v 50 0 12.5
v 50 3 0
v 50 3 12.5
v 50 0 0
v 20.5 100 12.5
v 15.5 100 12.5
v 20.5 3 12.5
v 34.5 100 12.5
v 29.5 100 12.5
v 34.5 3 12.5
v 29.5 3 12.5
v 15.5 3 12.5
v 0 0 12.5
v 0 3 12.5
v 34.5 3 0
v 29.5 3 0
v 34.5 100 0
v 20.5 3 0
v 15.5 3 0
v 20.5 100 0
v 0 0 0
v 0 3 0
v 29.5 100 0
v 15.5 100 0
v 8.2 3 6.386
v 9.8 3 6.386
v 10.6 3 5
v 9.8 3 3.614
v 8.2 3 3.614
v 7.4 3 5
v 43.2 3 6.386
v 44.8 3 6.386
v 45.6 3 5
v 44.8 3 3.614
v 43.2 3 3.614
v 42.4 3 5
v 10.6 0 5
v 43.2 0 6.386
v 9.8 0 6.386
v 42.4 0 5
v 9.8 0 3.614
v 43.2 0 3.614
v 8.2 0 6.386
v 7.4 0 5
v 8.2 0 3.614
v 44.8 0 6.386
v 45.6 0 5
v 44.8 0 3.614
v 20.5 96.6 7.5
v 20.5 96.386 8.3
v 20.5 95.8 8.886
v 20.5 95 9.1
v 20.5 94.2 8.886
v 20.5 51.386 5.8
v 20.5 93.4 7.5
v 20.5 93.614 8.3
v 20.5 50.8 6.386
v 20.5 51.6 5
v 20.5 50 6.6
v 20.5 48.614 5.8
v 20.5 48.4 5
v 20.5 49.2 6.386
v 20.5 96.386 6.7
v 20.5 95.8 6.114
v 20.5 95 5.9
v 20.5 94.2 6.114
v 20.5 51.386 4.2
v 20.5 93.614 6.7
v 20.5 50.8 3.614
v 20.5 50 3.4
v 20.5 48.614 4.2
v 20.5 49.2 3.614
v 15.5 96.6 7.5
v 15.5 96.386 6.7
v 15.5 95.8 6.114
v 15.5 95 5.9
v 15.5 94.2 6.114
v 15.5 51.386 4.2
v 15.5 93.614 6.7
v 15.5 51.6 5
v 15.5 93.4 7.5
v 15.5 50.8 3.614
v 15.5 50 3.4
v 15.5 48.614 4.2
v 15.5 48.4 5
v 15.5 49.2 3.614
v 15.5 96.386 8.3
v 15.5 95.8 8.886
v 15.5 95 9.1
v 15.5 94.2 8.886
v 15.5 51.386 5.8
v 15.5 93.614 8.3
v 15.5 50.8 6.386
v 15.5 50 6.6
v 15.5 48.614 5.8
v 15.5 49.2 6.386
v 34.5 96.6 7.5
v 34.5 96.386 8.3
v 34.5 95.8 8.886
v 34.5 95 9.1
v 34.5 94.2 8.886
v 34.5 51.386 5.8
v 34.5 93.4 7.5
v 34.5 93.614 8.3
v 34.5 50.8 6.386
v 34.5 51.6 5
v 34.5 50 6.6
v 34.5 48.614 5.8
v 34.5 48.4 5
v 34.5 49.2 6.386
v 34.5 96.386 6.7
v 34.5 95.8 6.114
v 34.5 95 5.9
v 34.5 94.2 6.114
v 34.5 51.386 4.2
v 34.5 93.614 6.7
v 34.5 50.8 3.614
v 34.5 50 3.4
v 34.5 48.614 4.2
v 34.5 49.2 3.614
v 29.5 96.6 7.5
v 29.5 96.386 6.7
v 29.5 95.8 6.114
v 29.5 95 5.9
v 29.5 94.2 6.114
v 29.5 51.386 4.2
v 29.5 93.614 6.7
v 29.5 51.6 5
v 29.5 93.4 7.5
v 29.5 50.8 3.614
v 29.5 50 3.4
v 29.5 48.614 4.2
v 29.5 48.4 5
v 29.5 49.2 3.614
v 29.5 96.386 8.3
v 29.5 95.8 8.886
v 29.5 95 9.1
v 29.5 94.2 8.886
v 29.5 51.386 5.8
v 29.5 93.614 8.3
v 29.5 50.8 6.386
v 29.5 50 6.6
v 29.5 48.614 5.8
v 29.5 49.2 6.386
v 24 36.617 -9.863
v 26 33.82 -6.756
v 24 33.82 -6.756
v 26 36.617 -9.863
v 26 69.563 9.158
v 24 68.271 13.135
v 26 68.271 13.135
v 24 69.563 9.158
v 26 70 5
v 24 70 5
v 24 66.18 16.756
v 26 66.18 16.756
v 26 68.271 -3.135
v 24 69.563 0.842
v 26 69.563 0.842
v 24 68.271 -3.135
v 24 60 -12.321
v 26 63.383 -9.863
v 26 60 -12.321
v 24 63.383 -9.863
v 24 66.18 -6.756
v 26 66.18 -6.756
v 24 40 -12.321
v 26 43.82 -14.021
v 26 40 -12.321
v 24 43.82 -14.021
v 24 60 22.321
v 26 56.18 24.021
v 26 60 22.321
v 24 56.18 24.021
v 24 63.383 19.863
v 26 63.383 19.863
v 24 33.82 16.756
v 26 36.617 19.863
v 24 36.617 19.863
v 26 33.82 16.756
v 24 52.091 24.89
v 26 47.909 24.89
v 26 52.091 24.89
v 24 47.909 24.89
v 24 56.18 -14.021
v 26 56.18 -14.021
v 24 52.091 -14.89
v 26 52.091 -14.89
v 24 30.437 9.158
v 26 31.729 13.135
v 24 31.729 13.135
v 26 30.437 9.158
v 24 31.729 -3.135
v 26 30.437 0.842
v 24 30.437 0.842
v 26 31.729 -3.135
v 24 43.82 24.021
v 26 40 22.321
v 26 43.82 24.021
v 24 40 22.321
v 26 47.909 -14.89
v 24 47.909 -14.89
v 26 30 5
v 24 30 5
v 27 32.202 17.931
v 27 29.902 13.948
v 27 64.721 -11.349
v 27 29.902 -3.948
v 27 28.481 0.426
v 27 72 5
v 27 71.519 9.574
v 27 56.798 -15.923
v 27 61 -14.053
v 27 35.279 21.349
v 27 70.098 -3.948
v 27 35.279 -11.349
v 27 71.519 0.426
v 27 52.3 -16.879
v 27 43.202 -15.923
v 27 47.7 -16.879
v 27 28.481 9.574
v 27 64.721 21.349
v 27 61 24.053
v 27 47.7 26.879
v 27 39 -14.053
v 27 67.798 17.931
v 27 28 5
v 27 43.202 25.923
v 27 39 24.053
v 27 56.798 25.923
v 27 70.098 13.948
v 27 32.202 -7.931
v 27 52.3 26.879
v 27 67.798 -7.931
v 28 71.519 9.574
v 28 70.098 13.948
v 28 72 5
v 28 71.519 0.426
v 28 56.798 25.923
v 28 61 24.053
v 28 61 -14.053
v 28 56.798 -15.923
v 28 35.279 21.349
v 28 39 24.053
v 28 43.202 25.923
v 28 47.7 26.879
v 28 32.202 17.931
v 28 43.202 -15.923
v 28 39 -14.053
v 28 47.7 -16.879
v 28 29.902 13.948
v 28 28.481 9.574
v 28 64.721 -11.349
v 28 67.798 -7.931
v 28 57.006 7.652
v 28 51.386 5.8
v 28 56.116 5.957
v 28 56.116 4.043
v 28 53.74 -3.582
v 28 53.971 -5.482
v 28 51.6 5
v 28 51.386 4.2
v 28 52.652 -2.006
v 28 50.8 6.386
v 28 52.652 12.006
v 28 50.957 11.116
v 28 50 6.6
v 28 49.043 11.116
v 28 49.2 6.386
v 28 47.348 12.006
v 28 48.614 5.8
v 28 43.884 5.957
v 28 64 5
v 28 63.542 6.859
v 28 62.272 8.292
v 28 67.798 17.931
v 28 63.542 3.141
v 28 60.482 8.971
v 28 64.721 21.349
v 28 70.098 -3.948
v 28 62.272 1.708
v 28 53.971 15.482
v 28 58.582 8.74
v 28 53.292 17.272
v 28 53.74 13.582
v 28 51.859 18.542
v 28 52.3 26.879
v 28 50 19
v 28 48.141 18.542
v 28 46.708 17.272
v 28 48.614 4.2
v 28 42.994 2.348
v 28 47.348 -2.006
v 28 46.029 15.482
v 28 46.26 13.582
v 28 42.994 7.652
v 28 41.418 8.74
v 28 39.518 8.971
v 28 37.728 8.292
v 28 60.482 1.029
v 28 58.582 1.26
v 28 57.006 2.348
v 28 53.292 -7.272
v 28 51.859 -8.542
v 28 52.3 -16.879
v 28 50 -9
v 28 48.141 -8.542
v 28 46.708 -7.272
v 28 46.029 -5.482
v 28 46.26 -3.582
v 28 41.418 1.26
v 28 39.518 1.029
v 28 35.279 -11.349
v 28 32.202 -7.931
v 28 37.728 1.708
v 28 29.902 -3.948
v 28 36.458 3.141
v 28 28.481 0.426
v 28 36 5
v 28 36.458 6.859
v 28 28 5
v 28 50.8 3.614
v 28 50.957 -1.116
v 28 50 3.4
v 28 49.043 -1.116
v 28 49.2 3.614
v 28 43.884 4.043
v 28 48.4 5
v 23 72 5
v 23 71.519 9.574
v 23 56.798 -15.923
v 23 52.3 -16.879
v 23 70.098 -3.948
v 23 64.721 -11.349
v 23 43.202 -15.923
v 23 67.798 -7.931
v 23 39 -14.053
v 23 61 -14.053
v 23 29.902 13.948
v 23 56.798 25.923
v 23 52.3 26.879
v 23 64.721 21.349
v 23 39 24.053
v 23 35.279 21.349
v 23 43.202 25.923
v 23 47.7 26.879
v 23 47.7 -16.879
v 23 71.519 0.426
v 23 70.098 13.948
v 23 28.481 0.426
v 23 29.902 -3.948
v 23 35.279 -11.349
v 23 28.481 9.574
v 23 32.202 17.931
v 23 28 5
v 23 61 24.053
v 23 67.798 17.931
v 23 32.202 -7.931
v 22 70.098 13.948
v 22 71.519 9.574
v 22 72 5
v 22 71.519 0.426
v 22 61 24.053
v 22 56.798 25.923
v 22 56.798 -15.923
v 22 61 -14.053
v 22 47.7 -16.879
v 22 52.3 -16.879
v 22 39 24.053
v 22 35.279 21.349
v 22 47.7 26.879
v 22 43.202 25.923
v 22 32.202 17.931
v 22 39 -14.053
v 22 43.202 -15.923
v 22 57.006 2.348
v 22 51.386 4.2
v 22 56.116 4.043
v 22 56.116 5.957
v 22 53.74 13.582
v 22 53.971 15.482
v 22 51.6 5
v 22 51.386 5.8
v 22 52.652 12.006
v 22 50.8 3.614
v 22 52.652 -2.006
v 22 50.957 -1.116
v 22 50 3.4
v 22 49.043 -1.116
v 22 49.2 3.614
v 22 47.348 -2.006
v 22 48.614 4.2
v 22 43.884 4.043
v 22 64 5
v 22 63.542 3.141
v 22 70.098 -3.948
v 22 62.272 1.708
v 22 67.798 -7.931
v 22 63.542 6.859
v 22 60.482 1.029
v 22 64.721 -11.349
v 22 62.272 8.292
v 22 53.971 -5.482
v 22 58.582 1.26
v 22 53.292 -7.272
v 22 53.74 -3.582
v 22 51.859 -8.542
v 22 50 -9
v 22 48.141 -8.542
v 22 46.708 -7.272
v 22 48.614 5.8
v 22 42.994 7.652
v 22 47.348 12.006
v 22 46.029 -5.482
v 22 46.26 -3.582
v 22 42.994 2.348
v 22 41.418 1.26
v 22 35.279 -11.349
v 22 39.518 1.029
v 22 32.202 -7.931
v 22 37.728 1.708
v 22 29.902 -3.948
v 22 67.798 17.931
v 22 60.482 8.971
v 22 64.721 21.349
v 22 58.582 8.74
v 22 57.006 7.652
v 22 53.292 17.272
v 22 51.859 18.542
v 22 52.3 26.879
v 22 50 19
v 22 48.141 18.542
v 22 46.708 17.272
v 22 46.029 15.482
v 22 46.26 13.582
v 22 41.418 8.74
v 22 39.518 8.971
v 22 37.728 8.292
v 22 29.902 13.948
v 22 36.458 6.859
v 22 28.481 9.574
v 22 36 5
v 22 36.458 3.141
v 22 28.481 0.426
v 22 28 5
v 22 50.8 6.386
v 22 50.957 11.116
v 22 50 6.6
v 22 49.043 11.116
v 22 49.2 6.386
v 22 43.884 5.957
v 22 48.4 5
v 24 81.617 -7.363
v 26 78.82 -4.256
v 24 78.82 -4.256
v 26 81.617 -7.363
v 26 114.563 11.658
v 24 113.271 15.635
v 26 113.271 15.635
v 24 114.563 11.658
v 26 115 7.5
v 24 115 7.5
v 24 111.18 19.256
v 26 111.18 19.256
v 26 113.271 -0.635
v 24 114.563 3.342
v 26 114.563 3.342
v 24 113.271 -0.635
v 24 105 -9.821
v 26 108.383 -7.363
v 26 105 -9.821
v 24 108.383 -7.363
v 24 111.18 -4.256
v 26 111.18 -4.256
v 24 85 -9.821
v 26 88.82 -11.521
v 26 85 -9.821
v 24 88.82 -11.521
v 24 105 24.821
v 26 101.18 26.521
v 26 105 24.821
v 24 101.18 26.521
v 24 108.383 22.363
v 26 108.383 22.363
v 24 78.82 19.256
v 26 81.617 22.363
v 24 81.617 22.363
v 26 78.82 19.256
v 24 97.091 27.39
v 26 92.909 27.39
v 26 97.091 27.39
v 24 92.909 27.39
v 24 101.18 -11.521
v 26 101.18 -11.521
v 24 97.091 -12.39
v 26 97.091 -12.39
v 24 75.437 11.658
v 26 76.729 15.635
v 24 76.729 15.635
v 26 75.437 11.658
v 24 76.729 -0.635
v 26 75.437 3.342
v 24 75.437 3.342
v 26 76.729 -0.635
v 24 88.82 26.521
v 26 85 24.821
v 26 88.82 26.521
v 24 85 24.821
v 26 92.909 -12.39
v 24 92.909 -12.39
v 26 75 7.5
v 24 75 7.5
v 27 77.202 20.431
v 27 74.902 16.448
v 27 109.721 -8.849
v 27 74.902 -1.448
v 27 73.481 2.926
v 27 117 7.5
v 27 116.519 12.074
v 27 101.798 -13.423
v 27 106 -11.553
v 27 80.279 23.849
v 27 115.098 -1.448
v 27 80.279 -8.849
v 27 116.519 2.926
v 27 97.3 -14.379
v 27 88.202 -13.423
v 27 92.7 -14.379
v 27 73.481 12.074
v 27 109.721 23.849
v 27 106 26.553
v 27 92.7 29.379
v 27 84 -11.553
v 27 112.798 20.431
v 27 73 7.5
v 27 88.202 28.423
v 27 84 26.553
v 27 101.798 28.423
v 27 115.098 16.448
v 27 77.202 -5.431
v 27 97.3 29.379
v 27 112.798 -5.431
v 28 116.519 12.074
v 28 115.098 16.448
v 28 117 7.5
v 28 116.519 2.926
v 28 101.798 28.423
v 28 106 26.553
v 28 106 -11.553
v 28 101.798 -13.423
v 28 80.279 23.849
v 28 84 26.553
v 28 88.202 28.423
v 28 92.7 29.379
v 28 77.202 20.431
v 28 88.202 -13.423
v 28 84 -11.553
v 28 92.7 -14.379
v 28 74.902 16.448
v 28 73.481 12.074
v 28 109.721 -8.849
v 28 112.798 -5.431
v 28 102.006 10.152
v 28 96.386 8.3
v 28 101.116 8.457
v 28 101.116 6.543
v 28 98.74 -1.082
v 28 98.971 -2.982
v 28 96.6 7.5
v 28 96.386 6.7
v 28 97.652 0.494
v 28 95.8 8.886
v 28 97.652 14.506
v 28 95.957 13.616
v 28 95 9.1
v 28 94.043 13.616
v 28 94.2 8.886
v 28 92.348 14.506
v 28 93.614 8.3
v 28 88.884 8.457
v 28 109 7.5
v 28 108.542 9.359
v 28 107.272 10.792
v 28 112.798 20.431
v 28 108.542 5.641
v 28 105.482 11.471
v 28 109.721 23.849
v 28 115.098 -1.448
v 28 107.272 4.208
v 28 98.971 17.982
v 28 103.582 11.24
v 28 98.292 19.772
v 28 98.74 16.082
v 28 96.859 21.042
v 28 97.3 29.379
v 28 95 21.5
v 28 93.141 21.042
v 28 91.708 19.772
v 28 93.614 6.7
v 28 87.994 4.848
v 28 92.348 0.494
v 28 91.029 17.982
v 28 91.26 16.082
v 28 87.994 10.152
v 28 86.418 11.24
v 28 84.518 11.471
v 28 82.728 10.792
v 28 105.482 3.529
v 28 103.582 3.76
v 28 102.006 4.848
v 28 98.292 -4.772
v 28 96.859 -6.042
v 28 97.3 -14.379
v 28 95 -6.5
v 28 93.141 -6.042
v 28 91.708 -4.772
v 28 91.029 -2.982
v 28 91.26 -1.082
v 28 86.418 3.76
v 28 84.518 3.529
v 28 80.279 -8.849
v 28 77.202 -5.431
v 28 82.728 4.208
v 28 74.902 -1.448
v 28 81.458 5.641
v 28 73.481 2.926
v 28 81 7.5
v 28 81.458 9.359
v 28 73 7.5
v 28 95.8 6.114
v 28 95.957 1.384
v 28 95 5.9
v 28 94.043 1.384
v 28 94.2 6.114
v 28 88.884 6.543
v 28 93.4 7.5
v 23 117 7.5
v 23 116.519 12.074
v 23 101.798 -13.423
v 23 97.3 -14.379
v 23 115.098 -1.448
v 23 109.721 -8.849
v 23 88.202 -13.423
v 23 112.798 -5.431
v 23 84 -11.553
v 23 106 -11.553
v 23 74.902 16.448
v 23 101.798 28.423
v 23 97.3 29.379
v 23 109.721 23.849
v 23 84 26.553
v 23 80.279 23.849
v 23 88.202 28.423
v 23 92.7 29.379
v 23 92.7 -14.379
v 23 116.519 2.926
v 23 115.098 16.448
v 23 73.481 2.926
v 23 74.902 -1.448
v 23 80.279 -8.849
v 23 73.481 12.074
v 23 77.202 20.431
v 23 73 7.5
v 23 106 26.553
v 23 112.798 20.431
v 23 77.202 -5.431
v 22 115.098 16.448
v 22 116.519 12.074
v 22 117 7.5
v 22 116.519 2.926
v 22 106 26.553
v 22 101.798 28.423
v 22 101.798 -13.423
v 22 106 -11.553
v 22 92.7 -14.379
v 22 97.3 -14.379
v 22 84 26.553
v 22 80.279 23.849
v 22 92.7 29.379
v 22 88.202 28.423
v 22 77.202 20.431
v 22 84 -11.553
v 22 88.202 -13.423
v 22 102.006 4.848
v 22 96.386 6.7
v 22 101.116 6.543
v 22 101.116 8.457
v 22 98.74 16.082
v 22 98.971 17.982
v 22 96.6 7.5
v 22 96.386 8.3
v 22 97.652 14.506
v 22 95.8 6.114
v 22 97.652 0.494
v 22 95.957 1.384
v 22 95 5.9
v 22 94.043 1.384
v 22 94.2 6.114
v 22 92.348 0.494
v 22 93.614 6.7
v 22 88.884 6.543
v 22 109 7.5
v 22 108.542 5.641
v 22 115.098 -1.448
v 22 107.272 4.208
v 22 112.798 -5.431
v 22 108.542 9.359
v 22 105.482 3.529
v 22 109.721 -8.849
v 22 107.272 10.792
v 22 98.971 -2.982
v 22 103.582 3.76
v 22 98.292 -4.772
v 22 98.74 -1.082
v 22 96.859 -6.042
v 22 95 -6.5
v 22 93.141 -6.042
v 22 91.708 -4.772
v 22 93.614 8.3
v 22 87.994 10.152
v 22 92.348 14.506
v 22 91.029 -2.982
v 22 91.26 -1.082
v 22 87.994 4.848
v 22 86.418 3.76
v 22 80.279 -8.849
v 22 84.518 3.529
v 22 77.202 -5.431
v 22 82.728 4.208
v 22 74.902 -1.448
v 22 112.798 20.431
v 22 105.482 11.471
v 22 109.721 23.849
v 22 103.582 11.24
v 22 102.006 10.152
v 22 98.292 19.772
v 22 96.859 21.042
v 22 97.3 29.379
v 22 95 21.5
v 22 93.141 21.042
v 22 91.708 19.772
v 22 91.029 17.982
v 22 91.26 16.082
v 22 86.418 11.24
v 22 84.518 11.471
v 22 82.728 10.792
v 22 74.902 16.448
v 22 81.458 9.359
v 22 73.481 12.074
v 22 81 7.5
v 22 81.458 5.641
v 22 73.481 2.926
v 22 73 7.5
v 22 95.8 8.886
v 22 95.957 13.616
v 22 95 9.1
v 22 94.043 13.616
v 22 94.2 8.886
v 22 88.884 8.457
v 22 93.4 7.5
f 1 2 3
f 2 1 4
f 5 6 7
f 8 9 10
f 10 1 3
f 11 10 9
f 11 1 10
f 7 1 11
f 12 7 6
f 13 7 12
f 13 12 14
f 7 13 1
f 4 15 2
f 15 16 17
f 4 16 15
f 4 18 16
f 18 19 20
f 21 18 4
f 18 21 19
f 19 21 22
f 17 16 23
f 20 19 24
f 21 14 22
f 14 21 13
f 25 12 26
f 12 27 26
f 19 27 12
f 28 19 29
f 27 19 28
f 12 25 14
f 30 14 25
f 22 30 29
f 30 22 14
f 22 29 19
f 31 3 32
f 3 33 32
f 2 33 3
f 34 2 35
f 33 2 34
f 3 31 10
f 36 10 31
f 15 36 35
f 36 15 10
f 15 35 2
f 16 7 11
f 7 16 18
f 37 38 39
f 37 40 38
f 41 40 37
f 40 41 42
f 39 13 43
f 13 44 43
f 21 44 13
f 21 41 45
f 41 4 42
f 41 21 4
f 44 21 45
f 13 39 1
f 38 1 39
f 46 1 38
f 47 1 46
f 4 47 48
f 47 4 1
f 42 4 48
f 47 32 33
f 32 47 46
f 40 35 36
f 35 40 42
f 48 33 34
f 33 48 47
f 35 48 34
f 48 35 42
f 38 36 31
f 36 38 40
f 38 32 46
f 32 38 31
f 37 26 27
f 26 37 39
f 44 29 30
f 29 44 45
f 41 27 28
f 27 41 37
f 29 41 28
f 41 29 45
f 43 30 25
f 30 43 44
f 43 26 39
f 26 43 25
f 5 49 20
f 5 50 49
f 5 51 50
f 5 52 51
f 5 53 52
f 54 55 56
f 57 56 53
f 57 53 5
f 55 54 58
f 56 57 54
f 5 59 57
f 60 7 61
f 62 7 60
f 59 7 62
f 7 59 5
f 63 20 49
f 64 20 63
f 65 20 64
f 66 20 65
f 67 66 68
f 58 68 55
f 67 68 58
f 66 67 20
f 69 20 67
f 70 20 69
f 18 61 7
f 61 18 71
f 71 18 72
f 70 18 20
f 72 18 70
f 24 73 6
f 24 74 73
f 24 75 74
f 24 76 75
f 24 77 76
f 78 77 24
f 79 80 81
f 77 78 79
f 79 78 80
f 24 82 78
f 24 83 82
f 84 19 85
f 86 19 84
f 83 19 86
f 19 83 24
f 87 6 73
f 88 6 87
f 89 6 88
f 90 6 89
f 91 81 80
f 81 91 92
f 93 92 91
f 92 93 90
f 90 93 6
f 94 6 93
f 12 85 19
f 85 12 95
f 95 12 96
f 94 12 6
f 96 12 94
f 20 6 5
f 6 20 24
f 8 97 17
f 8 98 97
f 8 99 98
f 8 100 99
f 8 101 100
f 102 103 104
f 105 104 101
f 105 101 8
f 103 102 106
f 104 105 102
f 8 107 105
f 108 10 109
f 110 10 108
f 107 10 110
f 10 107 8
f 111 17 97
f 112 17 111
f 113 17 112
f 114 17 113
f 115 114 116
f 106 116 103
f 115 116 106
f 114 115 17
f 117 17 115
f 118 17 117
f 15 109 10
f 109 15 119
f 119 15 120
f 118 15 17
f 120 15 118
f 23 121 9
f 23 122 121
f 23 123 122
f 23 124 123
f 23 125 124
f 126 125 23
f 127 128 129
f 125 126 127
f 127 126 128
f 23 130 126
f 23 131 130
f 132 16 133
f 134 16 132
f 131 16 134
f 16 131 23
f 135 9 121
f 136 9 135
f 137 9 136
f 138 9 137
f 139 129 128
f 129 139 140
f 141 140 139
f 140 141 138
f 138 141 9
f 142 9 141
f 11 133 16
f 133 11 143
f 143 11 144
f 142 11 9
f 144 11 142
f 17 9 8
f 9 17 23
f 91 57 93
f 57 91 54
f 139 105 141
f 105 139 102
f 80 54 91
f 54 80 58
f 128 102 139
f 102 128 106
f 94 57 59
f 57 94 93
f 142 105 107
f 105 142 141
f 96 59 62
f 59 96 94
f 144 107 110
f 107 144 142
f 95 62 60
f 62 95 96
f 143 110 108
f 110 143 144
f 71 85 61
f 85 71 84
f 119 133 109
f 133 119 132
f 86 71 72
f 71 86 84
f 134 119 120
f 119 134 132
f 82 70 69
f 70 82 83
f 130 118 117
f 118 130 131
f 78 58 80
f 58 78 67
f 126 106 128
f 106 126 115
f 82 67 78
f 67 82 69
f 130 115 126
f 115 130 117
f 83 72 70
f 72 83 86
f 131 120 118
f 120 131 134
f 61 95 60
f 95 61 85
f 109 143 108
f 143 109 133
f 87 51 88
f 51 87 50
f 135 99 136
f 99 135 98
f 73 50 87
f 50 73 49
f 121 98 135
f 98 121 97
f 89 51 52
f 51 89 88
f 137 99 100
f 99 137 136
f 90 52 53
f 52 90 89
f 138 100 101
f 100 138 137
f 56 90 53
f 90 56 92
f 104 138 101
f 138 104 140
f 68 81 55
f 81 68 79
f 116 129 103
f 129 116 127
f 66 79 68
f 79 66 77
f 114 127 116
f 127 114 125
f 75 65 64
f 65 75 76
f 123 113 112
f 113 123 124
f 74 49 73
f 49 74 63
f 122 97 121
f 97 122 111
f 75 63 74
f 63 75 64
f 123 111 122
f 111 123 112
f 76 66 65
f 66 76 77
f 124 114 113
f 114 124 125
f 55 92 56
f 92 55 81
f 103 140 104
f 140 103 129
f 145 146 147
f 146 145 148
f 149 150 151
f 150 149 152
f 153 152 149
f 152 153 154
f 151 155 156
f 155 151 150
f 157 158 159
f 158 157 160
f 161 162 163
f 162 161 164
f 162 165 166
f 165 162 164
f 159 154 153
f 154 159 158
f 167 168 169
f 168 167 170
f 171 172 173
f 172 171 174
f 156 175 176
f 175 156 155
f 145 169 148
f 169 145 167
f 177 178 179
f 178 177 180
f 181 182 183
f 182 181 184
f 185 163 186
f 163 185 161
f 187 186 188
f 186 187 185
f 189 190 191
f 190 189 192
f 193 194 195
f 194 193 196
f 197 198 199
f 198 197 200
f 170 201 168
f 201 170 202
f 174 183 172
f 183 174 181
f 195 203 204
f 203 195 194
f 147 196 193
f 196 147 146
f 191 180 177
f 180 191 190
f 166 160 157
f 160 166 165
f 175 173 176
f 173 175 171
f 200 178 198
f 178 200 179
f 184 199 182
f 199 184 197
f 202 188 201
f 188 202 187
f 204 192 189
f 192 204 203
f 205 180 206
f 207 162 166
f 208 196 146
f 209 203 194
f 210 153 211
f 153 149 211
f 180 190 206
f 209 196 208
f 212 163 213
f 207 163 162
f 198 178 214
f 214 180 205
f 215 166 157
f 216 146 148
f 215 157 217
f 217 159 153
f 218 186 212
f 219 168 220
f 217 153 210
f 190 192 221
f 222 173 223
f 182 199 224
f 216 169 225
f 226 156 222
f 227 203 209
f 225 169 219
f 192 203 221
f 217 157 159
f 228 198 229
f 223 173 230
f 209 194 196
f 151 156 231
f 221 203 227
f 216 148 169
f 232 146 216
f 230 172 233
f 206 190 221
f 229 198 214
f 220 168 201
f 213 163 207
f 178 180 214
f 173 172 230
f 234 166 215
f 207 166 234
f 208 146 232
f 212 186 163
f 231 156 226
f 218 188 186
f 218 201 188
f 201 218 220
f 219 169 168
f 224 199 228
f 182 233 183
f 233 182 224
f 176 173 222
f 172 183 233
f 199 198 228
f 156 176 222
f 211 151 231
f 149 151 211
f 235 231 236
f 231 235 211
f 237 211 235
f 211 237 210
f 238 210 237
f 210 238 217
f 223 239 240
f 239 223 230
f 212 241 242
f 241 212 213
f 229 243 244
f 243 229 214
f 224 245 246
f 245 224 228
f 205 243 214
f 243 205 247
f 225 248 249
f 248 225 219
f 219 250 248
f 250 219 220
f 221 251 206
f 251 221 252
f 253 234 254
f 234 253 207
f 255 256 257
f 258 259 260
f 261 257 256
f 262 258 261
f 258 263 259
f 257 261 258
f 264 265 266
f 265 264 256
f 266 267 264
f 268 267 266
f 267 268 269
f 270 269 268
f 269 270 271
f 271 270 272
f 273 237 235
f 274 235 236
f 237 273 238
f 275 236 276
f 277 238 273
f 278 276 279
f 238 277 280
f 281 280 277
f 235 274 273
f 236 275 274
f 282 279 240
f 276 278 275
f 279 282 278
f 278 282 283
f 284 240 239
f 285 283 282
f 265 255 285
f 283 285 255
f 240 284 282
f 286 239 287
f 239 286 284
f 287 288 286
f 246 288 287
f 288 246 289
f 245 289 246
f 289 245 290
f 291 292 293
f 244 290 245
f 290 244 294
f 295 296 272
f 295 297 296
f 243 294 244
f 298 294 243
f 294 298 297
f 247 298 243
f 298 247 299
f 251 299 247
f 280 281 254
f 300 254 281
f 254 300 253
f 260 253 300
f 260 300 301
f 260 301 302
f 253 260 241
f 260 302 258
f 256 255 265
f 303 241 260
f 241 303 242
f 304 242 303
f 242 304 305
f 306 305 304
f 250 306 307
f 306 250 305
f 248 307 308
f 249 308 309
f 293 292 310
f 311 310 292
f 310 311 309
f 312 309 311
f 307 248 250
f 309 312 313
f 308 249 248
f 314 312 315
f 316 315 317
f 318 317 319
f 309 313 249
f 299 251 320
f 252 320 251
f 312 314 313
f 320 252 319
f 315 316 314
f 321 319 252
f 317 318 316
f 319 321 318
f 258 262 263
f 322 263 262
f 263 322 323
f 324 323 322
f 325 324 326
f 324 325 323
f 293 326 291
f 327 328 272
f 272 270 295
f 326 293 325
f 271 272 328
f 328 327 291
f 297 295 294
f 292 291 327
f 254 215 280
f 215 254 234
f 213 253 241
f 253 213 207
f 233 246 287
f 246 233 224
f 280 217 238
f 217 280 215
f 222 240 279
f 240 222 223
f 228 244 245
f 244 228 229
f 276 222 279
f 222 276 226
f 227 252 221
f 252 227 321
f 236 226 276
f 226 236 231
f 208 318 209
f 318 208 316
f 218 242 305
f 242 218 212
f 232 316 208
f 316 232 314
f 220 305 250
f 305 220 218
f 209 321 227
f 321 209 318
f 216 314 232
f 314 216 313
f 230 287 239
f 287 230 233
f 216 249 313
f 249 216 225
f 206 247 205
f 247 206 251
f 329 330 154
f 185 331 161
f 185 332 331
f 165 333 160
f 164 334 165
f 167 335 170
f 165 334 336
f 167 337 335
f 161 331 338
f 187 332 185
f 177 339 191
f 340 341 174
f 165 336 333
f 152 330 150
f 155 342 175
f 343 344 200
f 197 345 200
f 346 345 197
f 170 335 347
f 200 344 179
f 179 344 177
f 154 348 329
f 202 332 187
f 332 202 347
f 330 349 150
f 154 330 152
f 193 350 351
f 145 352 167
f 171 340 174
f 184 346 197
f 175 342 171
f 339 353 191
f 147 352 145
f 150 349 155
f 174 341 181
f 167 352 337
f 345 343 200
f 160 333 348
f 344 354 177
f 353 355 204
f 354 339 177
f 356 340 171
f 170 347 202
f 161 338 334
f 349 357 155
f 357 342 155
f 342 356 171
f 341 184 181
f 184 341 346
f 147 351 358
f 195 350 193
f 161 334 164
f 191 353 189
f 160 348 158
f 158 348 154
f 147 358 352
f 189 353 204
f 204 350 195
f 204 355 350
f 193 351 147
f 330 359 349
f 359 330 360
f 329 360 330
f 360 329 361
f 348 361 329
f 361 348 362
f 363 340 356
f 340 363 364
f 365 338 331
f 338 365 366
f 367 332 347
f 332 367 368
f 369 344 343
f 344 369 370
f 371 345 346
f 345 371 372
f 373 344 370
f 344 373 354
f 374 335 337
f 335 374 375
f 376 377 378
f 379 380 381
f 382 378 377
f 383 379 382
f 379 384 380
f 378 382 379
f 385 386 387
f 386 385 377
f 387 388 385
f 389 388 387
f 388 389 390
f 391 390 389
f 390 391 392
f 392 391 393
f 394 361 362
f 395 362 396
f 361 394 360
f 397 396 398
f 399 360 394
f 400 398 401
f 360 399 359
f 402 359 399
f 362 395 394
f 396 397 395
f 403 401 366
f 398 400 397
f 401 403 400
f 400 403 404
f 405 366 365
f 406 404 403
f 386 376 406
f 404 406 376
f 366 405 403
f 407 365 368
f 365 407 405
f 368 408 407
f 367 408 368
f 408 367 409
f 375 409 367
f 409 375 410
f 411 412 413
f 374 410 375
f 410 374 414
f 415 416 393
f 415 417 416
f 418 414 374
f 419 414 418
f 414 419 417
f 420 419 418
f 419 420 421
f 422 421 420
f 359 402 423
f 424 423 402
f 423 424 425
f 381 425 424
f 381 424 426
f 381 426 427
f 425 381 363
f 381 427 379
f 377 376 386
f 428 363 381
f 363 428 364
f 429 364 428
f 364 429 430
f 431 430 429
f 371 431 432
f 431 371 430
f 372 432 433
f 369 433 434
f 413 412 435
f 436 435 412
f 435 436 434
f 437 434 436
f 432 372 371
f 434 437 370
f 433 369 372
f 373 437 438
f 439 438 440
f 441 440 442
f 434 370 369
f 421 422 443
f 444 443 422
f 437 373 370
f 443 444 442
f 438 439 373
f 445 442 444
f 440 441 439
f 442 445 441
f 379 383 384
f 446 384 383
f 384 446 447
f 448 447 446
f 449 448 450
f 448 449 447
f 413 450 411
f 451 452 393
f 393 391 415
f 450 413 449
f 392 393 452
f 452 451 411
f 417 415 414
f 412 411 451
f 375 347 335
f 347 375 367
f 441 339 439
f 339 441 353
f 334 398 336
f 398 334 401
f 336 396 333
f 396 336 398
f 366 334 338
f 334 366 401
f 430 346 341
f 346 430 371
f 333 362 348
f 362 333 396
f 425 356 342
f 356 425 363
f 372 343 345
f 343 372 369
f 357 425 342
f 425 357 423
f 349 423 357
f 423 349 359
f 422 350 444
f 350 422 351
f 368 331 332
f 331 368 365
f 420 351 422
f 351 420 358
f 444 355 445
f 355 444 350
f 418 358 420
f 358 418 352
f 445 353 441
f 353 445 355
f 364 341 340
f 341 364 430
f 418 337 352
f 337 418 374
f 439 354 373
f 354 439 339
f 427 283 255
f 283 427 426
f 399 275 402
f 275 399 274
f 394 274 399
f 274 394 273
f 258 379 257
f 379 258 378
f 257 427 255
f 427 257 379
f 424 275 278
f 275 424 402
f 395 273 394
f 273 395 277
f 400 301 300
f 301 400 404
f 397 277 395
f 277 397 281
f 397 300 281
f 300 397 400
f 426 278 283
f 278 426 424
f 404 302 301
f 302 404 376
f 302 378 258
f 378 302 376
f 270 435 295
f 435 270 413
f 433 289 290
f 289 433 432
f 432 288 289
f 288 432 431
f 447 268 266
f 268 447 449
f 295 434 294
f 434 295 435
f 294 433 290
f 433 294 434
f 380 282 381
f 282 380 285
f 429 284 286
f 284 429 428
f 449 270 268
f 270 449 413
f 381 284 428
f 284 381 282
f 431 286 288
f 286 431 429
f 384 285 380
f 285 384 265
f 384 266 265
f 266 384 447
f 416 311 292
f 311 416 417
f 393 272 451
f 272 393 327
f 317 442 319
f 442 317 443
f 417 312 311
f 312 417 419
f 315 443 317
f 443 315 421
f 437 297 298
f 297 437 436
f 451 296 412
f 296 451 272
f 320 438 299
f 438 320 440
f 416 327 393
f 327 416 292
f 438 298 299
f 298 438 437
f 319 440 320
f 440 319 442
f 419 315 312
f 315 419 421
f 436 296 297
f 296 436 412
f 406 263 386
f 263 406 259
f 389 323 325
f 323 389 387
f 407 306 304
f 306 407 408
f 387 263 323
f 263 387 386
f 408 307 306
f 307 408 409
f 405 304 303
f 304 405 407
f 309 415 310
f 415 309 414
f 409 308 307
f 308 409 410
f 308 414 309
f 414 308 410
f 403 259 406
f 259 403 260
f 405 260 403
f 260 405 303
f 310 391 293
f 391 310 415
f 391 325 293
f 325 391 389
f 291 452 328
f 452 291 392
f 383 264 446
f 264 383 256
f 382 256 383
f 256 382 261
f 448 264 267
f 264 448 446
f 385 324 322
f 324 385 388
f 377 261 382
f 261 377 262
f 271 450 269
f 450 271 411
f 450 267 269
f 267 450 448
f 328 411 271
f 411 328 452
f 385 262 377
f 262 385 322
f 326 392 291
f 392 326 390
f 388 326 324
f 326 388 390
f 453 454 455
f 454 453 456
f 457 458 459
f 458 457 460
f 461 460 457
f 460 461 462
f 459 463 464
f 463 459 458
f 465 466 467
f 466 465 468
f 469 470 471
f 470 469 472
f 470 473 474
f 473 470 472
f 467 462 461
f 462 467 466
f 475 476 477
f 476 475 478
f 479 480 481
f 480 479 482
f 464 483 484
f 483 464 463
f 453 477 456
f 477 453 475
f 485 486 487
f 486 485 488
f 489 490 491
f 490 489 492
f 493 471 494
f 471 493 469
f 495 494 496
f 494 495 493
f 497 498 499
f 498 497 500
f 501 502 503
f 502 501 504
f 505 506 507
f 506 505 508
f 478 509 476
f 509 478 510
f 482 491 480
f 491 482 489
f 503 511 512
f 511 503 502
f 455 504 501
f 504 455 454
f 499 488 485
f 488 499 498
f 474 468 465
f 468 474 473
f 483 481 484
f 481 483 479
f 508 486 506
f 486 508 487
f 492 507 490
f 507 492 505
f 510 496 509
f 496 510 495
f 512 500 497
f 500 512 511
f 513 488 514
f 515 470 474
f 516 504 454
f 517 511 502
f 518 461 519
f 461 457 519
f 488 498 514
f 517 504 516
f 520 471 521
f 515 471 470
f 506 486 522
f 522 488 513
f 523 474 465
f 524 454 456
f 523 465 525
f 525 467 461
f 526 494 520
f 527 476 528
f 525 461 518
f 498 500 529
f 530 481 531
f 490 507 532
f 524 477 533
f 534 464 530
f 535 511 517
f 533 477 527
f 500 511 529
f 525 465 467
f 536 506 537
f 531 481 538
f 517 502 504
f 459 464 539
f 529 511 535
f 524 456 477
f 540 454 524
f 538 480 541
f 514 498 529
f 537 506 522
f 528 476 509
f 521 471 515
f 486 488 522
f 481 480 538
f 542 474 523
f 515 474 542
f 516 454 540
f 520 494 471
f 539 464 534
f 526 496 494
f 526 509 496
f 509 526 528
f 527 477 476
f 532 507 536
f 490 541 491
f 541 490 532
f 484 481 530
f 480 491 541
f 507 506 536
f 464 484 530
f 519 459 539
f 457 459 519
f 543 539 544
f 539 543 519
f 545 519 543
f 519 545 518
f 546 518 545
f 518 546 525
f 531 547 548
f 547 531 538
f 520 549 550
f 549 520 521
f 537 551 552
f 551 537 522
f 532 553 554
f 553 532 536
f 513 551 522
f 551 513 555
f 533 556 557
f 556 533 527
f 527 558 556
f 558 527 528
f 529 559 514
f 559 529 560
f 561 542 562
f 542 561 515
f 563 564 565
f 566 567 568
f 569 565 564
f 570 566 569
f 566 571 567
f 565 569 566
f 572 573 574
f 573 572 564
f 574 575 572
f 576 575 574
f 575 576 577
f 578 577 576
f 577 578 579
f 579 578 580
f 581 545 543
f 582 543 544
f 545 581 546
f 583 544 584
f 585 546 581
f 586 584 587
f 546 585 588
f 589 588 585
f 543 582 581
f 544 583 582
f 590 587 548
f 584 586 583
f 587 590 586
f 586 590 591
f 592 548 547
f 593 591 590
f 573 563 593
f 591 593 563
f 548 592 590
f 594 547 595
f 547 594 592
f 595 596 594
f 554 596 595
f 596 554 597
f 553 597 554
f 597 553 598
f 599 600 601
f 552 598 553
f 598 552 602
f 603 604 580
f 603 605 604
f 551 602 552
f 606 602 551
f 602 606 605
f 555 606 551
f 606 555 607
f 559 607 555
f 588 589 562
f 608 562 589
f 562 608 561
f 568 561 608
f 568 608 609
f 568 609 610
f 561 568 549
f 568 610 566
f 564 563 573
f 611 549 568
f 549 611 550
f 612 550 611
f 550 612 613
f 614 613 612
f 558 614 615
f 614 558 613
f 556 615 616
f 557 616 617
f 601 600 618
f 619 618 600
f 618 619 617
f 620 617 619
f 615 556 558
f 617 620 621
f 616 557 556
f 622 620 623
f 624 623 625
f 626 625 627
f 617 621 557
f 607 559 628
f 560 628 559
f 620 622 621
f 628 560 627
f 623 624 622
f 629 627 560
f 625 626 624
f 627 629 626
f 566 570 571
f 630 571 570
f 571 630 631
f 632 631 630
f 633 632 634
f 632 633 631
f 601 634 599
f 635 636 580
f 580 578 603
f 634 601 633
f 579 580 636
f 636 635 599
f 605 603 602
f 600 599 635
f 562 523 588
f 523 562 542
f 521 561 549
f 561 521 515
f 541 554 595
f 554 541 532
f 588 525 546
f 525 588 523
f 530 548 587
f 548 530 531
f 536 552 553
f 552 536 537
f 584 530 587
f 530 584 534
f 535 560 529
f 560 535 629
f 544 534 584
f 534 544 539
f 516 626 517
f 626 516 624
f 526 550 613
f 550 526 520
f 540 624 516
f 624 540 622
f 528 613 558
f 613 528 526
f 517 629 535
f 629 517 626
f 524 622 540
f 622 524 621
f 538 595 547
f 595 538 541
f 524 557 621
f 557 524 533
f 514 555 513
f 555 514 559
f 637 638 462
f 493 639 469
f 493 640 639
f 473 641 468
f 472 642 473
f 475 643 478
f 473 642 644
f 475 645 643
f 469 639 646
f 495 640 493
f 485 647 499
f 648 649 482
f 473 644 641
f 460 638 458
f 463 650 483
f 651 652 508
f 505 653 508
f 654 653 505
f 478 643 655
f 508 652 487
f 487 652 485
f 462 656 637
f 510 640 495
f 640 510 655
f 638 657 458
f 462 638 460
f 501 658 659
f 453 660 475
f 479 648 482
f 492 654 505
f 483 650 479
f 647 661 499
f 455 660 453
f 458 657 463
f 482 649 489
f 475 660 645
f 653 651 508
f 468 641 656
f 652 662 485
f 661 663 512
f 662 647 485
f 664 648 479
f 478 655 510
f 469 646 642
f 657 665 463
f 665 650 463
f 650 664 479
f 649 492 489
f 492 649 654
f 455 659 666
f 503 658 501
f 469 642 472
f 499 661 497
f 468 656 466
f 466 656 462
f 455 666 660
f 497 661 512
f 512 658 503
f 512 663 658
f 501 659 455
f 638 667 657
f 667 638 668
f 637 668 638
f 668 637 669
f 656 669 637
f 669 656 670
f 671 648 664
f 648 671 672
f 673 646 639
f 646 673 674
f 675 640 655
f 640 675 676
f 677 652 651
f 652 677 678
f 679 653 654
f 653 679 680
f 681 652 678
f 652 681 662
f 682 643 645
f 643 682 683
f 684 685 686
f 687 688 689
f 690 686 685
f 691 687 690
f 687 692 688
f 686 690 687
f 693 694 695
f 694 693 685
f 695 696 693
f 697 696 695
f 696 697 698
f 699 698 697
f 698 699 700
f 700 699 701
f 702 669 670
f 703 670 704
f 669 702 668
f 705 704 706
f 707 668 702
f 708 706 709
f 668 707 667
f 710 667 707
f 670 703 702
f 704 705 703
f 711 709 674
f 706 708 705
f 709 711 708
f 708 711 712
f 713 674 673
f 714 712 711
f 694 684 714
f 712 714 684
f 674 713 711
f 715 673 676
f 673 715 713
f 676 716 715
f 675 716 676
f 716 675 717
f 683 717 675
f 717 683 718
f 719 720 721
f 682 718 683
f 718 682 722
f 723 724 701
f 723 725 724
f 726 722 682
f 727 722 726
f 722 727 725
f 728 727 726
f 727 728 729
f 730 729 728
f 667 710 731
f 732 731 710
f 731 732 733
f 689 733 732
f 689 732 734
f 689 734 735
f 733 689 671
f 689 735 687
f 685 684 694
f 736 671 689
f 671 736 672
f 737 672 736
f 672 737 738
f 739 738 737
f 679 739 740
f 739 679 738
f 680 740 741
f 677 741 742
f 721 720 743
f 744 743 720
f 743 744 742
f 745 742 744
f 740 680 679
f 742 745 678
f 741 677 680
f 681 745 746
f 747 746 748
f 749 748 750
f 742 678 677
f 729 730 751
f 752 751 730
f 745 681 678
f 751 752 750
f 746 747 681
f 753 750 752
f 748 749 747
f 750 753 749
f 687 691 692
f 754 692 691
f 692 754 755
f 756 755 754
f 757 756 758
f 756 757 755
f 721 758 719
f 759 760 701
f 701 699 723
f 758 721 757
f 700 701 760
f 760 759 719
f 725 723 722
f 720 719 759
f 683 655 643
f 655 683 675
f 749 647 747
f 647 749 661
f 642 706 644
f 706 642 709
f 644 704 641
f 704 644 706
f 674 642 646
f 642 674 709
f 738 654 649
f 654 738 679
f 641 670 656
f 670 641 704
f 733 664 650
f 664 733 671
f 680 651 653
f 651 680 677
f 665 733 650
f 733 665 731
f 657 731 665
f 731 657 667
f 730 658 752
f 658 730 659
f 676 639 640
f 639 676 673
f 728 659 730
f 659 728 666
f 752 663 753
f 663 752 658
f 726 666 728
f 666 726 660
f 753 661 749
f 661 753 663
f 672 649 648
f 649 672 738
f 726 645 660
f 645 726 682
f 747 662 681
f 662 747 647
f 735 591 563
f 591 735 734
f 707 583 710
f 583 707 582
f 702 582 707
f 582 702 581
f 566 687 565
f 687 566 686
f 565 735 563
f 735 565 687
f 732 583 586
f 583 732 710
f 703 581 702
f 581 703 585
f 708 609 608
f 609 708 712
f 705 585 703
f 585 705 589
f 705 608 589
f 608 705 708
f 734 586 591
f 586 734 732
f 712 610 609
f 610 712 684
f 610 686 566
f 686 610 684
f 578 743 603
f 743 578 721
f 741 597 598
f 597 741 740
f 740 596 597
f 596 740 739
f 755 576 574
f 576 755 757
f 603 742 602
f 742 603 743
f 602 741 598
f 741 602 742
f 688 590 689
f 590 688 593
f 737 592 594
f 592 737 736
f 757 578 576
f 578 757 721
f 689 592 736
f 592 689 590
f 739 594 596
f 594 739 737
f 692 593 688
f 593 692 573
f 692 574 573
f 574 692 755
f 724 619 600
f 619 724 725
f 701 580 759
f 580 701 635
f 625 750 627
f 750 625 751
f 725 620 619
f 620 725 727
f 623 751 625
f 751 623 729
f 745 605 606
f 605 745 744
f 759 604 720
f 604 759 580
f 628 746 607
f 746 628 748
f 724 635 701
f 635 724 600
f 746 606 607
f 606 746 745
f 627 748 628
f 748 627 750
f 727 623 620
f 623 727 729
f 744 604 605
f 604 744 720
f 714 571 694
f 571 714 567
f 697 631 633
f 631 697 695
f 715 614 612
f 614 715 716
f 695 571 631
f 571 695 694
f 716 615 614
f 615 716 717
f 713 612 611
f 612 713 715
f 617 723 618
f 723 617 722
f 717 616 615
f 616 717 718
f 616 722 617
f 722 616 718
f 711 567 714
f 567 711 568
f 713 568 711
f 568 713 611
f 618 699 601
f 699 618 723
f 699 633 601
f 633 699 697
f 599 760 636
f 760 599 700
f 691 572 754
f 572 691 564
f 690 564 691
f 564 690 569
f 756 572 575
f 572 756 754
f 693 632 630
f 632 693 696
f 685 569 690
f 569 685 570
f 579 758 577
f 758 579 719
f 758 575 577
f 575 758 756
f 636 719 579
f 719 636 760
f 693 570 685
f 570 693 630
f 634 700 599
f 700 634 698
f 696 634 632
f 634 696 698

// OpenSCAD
// file: pulley.scad
include <vars.scad>

module pulley()
{
    rotate([90,0,0])
    difference()
    {
        union()
        {
            
            {
                cylinder(h = 2, r = 20);
                translate([0,0,2])
                cylinder(h = 1, r1 = 20, r2 = 22);
                translate([0,0,3])
                cylinder(h = 1, r = 22);
                translate([0,0,-1])
                cylinder(h = 1, r1 = 22, r2 = 20);
                translate([0,0,-2])
                cylinder(h = 1, r = 22);
            }
        }
        
        translate([0,0,-5])
        cylinder(h = 20, r = 1.6, $fn = 12);
        
        
        for(i = [0, 90, 180, 270])
        {
            rotate([0,0,i])
            translate([10,0,-3])
            cylinder(h = 8, r = 4);
        }
    }
    
}

color("Blue")
pulley();
// file: vars.scad
SIDE_WIDTH = 8;
RESERVE_V = 10;
RESERVE_H = 15;
RESERVE_R = 0.5;
OUTER_R = 100;
INNER_R = 25;
SPOOL_WIDTH = 70;
AXIS_R = 5;
// main file
include <vars.scad>
use <pulley.scad>

module pulley_mount()
{
    difference()
    {
        union()
        {
            cube(size = [50,3,12.5]);
        }
    
        translate([SIDE_WIDTH/2 + SPOOL_WIDTH/2 + RESERVE_H - 10,10,5])
        rotate([90,0,0])
        cylinder(h = 20, r = 1.6);
        
        translate([SIDE_WIDTH/2 + SPOOL_WIDTH/2 - 45 + RESERVE_H,10,5])
        rotate([90,0,0])
        cylinder(h = 20, r = 1.6);
    }
    
    difference()
    {
        translate([17.5,0,0])    
        union()
        {
            translate([-2,0,0])
            cube(size = [5,100,12.5]);
    
            translate([12,0,0])
            cube(size = [5,100,12.5]);
        }
    
        rotate([0,0,90])
        translate([50,-24,5])    
        {
            translate([0,20,0])
            rotate([90,00,0])
            cylinder(h = 40, r = 1.6, $fn = 12);
        }
    
        rotate([0,0,90])
        translate([95,-24,7.5])    
        {
            translate([0,20,0])
            rotate([90,00,0])
            cylinder(h = 40, r = 1.6, $fn = 12);
        }
    }
}

color("Blue")
pulley_mount();

color("Green")
translate([24,50,5])
rotate([0,0,90])
pulley();

color("Green")
translate([24,95,7.5])
rotate([0,0,90])
pulley();
